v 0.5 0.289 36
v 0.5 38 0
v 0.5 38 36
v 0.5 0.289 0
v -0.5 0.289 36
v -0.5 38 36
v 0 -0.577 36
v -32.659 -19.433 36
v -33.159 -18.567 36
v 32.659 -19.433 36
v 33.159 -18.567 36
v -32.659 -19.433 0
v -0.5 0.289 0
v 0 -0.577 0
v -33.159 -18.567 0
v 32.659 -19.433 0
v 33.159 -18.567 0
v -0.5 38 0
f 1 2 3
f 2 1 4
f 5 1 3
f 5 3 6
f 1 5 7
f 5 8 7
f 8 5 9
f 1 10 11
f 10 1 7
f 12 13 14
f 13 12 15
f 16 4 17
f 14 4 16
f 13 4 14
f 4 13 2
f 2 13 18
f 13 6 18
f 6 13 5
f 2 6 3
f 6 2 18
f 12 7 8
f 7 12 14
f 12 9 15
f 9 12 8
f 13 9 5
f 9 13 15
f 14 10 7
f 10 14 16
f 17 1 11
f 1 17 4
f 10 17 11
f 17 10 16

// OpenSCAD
// This work is licensed under the Creative Commons Attribution 4.0 International License.
// To view a copy of this license, visit http://creativecommons.org/licenses/by/4.0/
// or send a letter to Creative Commons, PO Box 1866, Mountain View, CA 94042, USA.

// Select US oz size, or 0 to use custom measurements.
canSize = 5.5; //[0,3,5.5]

// Only used if Predefined Size is 0
customHeight = 36;
// Only used if Predefined Size is 0
customDiameter = 76;

// Number of portions to create. If your cat needs a half can, set to 4 and give them two portions.
numberOfPortions = 3;//[3:1:10]

// Make thicker if your printer is having problems.
wallThickness = 1;

module dragons() {
  // Beyond this point be tunables that you shouldn't normally tune.
}
spokeCount=numberOfPortions;

// These numbers need measurements
threeOzHeight = 36;
fiveOzHeight = 36;
height = canSize == 5.5 ? fiveOzHeight : canSize == 3 ? threeOzHeight : customHeight;

// These numbers need measurements
threeOzDiameter = 58;
fiveOzDiameter = 76;
diameter = canSize == 5.5 ? fiveOzDiameter : canSize == 3 ? threeOzDiameter : customDiameter;

radius = diameter/2;

for(legRotation = [0 : 360/spokeCount: 360-spokeCount]) {
    rotate([0,0,legRotation]) translate([-wallThickness/2,0,0]) cube([wallThickness,radius,height]);
}
